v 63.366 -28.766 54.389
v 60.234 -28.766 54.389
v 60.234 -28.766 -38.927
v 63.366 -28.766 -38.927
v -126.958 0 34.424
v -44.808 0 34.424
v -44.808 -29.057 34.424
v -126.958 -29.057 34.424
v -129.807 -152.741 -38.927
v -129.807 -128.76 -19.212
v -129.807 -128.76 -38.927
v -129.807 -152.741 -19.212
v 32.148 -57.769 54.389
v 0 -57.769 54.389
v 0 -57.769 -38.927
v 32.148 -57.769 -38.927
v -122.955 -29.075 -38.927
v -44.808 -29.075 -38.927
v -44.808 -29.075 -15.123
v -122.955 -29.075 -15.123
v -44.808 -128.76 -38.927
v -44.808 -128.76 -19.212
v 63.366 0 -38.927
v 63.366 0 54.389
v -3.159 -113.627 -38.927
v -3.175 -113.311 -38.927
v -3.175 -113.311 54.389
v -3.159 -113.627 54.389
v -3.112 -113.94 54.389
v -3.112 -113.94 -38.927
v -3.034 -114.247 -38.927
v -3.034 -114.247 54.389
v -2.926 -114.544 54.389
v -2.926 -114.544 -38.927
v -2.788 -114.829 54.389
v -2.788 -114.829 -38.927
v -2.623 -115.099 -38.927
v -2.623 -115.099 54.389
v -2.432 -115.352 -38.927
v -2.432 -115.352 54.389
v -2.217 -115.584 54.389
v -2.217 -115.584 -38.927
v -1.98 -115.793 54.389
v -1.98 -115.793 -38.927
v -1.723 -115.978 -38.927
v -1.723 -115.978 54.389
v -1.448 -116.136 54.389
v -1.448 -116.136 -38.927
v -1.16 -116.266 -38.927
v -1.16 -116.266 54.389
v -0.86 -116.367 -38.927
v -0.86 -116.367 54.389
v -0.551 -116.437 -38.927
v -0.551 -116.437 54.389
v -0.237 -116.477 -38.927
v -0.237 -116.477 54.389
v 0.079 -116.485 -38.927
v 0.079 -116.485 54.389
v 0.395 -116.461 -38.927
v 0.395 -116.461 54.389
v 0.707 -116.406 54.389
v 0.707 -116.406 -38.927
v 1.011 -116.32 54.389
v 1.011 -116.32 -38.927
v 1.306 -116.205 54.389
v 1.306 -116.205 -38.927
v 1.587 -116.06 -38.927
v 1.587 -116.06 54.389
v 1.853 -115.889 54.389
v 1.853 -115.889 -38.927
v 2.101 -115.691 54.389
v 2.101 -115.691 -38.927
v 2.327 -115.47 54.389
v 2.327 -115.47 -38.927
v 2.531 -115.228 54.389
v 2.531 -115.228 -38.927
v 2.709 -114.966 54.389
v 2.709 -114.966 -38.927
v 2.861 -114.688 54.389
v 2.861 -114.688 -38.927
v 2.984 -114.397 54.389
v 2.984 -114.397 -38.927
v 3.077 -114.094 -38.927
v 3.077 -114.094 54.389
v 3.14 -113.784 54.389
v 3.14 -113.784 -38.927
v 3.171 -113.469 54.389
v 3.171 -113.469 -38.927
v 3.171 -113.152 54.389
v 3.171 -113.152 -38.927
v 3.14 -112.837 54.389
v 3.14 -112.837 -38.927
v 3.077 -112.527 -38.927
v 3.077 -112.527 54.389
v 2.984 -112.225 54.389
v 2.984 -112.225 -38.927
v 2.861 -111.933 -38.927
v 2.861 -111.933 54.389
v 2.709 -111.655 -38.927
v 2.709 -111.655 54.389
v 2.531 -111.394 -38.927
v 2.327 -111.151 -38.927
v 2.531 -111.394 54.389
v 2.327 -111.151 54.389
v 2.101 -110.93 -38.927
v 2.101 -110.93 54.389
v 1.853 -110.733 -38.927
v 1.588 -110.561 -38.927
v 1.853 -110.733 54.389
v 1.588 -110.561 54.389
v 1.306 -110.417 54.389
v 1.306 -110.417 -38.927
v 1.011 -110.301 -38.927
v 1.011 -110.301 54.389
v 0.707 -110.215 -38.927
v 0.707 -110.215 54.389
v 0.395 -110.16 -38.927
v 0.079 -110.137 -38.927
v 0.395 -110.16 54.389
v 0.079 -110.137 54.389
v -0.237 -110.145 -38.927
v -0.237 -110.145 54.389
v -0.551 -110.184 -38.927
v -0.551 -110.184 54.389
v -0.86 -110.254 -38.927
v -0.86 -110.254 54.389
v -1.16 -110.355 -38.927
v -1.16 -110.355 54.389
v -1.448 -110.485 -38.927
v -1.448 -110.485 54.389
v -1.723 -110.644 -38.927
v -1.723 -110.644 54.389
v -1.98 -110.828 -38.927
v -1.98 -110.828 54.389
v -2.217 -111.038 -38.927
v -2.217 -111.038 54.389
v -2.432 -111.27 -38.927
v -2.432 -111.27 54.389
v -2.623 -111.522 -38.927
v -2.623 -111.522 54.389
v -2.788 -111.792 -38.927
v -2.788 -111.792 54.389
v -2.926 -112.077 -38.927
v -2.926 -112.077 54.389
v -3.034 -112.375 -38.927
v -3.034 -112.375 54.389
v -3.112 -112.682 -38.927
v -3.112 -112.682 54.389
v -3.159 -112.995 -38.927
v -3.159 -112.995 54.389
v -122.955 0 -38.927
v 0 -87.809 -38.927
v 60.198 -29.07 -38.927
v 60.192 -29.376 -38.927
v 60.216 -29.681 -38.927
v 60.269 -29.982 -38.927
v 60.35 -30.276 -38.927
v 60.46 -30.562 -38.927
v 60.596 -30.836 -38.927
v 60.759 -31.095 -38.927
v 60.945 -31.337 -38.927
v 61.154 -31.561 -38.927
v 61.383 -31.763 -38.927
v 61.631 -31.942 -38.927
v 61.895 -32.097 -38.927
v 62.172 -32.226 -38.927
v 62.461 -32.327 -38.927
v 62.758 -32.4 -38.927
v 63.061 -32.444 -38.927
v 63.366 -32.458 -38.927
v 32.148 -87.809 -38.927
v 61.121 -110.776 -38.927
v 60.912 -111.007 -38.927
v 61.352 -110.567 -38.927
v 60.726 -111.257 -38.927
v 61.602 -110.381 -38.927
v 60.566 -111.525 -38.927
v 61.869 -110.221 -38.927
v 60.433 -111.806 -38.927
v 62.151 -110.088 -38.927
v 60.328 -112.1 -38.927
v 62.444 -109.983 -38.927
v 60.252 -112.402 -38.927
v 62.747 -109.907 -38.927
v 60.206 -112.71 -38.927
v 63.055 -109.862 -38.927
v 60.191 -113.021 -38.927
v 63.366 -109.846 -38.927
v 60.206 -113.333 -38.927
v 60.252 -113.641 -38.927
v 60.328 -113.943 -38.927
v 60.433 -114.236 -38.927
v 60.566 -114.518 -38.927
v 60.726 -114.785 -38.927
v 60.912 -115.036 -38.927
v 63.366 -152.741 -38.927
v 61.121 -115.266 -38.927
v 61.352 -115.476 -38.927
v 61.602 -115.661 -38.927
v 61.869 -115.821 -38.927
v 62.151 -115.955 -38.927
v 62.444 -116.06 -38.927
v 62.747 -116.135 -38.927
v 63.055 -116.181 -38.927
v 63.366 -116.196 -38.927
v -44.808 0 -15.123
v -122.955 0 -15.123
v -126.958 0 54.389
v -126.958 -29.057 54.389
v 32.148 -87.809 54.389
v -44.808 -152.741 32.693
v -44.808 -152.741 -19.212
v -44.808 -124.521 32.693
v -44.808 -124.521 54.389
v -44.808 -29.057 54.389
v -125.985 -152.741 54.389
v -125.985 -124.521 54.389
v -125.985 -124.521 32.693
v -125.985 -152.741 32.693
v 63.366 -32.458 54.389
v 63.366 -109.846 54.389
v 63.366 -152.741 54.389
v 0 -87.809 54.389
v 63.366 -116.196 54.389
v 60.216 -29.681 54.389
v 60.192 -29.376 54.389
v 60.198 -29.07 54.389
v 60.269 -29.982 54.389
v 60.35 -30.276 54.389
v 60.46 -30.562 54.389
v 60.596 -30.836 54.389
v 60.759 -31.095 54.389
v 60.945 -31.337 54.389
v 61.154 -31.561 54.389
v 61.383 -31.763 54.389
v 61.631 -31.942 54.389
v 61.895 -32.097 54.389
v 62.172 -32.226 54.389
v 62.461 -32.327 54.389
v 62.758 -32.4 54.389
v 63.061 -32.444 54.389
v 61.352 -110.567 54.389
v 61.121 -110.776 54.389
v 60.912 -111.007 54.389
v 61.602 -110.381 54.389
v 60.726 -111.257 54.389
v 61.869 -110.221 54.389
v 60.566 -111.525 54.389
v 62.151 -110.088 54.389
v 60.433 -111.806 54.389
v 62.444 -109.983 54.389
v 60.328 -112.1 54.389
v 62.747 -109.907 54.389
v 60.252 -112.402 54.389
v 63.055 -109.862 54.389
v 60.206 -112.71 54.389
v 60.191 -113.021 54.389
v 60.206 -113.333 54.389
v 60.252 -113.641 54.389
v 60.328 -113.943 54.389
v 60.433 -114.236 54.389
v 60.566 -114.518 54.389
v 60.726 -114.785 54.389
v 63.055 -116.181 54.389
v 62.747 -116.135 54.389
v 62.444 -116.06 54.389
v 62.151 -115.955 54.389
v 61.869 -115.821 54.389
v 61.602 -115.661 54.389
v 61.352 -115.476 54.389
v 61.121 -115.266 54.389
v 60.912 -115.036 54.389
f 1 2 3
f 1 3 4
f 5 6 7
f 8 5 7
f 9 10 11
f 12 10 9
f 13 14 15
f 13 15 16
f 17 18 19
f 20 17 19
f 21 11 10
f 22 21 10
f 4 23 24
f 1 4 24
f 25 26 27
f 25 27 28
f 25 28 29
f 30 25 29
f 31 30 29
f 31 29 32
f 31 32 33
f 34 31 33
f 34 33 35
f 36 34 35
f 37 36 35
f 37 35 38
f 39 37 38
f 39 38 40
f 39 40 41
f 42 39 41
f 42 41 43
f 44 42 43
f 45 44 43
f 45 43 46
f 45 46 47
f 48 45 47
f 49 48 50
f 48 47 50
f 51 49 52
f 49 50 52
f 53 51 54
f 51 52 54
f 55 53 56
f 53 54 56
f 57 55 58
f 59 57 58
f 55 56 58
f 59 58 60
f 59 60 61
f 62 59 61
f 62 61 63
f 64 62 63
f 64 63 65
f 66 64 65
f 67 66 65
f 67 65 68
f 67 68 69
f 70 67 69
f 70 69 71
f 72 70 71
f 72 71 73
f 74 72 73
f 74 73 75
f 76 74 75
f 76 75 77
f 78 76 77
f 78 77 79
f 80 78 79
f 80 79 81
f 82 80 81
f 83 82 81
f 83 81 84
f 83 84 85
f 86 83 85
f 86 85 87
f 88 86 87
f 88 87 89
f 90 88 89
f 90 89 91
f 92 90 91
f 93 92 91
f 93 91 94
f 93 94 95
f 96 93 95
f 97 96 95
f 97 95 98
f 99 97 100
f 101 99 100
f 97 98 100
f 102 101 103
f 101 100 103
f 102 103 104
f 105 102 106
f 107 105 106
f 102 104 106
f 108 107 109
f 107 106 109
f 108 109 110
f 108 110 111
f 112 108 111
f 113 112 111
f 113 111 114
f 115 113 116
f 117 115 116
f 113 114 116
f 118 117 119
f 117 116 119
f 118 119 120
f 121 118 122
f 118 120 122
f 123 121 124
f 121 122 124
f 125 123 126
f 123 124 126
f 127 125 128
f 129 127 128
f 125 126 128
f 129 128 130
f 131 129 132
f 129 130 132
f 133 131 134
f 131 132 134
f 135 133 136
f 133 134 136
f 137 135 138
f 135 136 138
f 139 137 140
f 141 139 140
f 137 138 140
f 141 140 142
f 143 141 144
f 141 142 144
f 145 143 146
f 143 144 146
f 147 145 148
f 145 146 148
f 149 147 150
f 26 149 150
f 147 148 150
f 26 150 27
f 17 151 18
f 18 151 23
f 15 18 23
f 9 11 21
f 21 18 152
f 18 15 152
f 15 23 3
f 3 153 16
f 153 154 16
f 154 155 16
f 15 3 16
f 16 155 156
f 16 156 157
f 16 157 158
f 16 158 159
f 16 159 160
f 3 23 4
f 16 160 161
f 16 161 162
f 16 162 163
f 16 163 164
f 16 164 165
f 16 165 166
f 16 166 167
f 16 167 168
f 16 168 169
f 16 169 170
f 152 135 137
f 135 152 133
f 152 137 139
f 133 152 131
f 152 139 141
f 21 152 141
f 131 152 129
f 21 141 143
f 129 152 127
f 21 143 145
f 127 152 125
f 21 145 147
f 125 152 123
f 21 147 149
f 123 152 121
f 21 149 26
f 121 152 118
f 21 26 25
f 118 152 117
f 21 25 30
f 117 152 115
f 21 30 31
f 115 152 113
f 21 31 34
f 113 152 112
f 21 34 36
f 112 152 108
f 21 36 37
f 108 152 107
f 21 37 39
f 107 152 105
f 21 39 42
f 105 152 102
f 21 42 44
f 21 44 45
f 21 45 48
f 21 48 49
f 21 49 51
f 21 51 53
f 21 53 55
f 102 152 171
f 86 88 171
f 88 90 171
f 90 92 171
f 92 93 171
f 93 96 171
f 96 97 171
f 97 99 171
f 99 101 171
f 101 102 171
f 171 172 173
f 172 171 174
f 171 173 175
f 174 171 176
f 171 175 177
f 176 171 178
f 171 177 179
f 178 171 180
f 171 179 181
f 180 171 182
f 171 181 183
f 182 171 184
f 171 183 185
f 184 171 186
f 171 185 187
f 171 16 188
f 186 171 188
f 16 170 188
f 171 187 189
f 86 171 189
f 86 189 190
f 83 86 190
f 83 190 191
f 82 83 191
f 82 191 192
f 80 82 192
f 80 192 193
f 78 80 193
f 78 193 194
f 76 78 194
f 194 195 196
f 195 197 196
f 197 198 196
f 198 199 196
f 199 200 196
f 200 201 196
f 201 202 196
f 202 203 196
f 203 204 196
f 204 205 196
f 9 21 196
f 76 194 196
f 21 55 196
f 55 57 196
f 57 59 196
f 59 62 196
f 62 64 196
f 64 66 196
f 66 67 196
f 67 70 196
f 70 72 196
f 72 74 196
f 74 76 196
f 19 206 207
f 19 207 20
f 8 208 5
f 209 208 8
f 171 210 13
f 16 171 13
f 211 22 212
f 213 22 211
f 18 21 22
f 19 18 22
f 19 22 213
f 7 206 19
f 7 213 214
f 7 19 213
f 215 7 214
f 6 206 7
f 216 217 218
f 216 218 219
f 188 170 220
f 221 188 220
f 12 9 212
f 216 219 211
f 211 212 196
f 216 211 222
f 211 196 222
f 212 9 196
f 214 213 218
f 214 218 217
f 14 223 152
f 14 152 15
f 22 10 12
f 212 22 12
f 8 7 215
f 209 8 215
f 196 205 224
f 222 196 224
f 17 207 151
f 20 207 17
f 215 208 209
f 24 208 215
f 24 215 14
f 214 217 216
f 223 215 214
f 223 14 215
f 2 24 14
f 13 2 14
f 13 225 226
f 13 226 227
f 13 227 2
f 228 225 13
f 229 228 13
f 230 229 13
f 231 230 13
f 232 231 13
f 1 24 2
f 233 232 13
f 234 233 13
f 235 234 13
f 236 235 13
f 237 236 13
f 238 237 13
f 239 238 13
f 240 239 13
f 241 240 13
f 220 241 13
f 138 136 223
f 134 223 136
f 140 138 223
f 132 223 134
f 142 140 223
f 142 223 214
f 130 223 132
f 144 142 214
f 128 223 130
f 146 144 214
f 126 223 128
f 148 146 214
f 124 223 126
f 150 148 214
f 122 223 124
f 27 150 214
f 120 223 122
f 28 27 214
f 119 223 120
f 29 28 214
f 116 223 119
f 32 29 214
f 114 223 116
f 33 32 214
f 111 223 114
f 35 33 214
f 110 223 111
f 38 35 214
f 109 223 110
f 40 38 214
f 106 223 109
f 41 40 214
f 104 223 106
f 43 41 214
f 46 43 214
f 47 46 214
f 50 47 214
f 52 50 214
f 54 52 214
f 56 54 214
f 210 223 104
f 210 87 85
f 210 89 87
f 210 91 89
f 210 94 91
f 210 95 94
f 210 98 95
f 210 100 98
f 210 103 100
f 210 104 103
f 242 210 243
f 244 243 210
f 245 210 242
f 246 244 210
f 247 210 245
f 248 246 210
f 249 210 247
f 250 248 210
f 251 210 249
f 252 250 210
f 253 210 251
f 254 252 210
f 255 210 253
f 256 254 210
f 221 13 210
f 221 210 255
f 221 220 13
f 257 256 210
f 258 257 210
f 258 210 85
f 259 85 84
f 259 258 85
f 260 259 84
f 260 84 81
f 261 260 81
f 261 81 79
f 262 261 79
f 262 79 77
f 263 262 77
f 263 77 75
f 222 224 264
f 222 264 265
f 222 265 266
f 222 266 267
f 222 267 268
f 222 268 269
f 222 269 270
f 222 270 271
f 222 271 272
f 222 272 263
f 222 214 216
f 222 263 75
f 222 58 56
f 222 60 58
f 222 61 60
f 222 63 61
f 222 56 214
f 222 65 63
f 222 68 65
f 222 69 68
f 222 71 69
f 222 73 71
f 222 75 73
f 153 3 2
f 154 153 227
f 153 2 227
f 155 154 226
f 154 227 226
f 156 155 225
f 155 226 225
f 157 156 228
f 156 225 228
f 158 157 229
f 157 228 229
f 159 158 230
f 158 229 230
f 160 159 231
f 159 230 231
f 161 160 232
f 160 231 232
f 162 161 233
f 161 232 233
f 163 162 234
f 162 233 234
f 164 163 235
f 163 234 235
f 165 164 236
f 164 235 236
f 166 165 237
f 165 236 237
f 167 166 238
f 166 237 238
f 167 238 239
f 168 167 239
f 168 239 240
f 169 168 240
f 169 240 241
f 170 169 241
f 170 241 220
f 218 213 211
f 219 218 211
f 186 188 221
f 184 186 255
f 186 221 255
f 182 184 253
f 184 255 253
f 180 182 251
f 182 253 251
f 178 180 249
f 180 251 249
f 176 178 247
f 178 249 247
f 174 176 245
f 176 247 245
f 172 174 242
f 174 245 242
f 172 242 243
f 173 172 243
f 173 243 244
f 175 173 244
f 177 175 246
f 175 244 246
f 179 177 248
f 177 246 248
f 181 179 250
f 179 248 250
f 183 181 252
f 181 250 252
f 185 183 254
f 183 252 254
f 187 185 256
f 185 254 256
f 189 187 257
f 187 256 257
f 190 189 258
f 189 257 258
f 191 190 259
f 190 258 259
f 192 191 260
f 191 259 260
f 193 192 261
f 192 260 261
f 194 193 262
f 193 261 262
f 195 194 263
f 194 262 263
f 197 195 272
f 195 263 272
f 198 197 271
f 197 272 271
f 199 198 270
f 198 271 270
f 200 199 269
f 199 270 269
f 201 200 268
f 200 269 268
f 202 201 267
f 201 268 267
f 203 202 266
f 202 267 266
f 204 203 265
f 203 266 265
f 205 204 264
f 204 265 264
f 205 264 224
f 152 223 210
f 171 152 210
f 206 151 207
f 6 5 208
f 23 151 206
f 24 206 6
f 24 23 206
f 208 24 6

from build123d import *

# Parameters (mm, degrees)
F0_W      = 108.1741899252
F0_H      = 93.3166369796
F1_DEPTH  = 152.7411602437
F2_W      = 28.2202102244
F2_H      = 21.6964222491
F3_DEPTH  = 81.1772439629
F4_W      = 29.056660831
F4_H      = 19.965454936
F5_DEPTH  = 82.1499973536
F6_W      = 23.9808671176
F6_H      = 19.7158064693
F7_DEPTH  = 84.9992781878
F8_W      = 29.0753766894
F8_H      = 23.8046133891
F9_DEPTH  = 78.1470183283
F11_D     = 6.35
F13_D     = 6.35
F14_DEPTH = 28.7660323083
F16_D     = 6.35
F17_W     = 32.1477130055
F17_H     = 30.0406292081
F18_DEPTH = 95.8115551621


with BuildPart() as f1:
    # F0 (on Front) → F1 (new body)
    with BuildSketch(Plane.XZ):
        with Locations((9.279049933, 7.7308379114)):
            Rectangle(F0_W, F0_H)
    extrude(amount=F1_DEPTH)

    # F2 (on face) → F3 (join)
    with BuildSketch(Plane(origin=(-44.8080450296, 0, 0), x_dir=(0, -1, 0), z_dir=(-1, 0, 0))):
        with Locations((138.6310551316, 43.5409452766)):
            Rectangle(F2_W, F2_H)
    extrude(amount=F3_DEPTH)

    # F4 (on face) → F5 (join)
    with BuildSketch(Plane(origin=(-44.8080450296, 0, 0), x_dir=(0, -1, 0), z_dir=(-1, 0, 0))):
        with Locations((14.5283304155, 44.4064289331)):
            Rectangle(F4_W, F4_H)
    extrude(amount=F5_DEPTH)

    # F6 (on face) → F7 (join)
    with BuildSketch(Plane(origin=(-44.8080450296, 0, 0), x_dir=(0, -1, 0), z_dir=(-1, 0, 0))):
        with Locations((140.7507266849, -29.0695773438)):
            Rectangle(F6_W, F6_H)
    extrude(amount=F7_DEPTH)

    # F8 (on face) → F9 (join)
    with BuildSketch(Plane(origin=(-44.8080450296, 0, 0), x_dir=(0, -1, 0), z_dir=(-1, 0, 0))):
        with Locations((14.5376883447, -27.0251738839)):
            Rectangle(F8_W, F8_H)
    extrude(amount=F9_DEPTH)

    # F11 (through all)
    with Locations(Plane(origin=(0, 0, -38.9274805784), x_dir=(1, 0, 0), z_dir=(0, 0, -1))):
        with Locations((63.3661448956, 113.0213215947)):
            Hole(F11_D / 2)

    # F13 (through all)
    with Locations(Plane(origin=(0, 0, -38.9274805784), x_dir=(1, 0, 0), z_dir=(0, 0, -1))):
        with Locations((63.3661448956, 29.2834546417)):
            Hole(F13_D / 2)

    # F0 (on Front) + F9_face1 (on face) → F14 (join)
    with BuildSketch(Plane.XZ):
        with Locations((9.279049933, 7.7308379114)):
            Rectangle(F0_W, F0_H)
    with BuildSketch(Plane(origin=(-14.9495070386, 0, 7.3997359), x_dir=(-1, 0, 0), z_dir=(0, 1, 0))):
        Polygon((112.0085353446, 46.9894205011), (-78.3156519342, 46.9894205011), (-78.3156519342, -46.3272164785), (108.0055563193, -46.3272164785), (108.0055563193, -22.5226030894), (29.858537991, -22.5226030894), (29.858537991, 27.0239655651), (112.0085353446, 27.0239655651), align=None)
    extrude(amount=F14_DEPTH, dir=(0, -1, 0))

    # F16 (through all)
    with Locations(Plane(origin=(0, 0, -38.9274805784), x_dir=(1, 0, 0), z_dir=(0, 0, -1))):
        with Locations((0, 113.3106648922)):
            Hole(F16_D / 2)

    # F17 (on face) → F18 (cut)
    with BuildSketch(Plane.XY.offset(54.3891564012)):
        with Locations((16.0738565028, -72.7889351547)):
            Rectangle(F17_W, F17_H)
    extrude(amount=-F18_DEPTH, mode=Mode.SUBTRACT)


solid = f1.part
